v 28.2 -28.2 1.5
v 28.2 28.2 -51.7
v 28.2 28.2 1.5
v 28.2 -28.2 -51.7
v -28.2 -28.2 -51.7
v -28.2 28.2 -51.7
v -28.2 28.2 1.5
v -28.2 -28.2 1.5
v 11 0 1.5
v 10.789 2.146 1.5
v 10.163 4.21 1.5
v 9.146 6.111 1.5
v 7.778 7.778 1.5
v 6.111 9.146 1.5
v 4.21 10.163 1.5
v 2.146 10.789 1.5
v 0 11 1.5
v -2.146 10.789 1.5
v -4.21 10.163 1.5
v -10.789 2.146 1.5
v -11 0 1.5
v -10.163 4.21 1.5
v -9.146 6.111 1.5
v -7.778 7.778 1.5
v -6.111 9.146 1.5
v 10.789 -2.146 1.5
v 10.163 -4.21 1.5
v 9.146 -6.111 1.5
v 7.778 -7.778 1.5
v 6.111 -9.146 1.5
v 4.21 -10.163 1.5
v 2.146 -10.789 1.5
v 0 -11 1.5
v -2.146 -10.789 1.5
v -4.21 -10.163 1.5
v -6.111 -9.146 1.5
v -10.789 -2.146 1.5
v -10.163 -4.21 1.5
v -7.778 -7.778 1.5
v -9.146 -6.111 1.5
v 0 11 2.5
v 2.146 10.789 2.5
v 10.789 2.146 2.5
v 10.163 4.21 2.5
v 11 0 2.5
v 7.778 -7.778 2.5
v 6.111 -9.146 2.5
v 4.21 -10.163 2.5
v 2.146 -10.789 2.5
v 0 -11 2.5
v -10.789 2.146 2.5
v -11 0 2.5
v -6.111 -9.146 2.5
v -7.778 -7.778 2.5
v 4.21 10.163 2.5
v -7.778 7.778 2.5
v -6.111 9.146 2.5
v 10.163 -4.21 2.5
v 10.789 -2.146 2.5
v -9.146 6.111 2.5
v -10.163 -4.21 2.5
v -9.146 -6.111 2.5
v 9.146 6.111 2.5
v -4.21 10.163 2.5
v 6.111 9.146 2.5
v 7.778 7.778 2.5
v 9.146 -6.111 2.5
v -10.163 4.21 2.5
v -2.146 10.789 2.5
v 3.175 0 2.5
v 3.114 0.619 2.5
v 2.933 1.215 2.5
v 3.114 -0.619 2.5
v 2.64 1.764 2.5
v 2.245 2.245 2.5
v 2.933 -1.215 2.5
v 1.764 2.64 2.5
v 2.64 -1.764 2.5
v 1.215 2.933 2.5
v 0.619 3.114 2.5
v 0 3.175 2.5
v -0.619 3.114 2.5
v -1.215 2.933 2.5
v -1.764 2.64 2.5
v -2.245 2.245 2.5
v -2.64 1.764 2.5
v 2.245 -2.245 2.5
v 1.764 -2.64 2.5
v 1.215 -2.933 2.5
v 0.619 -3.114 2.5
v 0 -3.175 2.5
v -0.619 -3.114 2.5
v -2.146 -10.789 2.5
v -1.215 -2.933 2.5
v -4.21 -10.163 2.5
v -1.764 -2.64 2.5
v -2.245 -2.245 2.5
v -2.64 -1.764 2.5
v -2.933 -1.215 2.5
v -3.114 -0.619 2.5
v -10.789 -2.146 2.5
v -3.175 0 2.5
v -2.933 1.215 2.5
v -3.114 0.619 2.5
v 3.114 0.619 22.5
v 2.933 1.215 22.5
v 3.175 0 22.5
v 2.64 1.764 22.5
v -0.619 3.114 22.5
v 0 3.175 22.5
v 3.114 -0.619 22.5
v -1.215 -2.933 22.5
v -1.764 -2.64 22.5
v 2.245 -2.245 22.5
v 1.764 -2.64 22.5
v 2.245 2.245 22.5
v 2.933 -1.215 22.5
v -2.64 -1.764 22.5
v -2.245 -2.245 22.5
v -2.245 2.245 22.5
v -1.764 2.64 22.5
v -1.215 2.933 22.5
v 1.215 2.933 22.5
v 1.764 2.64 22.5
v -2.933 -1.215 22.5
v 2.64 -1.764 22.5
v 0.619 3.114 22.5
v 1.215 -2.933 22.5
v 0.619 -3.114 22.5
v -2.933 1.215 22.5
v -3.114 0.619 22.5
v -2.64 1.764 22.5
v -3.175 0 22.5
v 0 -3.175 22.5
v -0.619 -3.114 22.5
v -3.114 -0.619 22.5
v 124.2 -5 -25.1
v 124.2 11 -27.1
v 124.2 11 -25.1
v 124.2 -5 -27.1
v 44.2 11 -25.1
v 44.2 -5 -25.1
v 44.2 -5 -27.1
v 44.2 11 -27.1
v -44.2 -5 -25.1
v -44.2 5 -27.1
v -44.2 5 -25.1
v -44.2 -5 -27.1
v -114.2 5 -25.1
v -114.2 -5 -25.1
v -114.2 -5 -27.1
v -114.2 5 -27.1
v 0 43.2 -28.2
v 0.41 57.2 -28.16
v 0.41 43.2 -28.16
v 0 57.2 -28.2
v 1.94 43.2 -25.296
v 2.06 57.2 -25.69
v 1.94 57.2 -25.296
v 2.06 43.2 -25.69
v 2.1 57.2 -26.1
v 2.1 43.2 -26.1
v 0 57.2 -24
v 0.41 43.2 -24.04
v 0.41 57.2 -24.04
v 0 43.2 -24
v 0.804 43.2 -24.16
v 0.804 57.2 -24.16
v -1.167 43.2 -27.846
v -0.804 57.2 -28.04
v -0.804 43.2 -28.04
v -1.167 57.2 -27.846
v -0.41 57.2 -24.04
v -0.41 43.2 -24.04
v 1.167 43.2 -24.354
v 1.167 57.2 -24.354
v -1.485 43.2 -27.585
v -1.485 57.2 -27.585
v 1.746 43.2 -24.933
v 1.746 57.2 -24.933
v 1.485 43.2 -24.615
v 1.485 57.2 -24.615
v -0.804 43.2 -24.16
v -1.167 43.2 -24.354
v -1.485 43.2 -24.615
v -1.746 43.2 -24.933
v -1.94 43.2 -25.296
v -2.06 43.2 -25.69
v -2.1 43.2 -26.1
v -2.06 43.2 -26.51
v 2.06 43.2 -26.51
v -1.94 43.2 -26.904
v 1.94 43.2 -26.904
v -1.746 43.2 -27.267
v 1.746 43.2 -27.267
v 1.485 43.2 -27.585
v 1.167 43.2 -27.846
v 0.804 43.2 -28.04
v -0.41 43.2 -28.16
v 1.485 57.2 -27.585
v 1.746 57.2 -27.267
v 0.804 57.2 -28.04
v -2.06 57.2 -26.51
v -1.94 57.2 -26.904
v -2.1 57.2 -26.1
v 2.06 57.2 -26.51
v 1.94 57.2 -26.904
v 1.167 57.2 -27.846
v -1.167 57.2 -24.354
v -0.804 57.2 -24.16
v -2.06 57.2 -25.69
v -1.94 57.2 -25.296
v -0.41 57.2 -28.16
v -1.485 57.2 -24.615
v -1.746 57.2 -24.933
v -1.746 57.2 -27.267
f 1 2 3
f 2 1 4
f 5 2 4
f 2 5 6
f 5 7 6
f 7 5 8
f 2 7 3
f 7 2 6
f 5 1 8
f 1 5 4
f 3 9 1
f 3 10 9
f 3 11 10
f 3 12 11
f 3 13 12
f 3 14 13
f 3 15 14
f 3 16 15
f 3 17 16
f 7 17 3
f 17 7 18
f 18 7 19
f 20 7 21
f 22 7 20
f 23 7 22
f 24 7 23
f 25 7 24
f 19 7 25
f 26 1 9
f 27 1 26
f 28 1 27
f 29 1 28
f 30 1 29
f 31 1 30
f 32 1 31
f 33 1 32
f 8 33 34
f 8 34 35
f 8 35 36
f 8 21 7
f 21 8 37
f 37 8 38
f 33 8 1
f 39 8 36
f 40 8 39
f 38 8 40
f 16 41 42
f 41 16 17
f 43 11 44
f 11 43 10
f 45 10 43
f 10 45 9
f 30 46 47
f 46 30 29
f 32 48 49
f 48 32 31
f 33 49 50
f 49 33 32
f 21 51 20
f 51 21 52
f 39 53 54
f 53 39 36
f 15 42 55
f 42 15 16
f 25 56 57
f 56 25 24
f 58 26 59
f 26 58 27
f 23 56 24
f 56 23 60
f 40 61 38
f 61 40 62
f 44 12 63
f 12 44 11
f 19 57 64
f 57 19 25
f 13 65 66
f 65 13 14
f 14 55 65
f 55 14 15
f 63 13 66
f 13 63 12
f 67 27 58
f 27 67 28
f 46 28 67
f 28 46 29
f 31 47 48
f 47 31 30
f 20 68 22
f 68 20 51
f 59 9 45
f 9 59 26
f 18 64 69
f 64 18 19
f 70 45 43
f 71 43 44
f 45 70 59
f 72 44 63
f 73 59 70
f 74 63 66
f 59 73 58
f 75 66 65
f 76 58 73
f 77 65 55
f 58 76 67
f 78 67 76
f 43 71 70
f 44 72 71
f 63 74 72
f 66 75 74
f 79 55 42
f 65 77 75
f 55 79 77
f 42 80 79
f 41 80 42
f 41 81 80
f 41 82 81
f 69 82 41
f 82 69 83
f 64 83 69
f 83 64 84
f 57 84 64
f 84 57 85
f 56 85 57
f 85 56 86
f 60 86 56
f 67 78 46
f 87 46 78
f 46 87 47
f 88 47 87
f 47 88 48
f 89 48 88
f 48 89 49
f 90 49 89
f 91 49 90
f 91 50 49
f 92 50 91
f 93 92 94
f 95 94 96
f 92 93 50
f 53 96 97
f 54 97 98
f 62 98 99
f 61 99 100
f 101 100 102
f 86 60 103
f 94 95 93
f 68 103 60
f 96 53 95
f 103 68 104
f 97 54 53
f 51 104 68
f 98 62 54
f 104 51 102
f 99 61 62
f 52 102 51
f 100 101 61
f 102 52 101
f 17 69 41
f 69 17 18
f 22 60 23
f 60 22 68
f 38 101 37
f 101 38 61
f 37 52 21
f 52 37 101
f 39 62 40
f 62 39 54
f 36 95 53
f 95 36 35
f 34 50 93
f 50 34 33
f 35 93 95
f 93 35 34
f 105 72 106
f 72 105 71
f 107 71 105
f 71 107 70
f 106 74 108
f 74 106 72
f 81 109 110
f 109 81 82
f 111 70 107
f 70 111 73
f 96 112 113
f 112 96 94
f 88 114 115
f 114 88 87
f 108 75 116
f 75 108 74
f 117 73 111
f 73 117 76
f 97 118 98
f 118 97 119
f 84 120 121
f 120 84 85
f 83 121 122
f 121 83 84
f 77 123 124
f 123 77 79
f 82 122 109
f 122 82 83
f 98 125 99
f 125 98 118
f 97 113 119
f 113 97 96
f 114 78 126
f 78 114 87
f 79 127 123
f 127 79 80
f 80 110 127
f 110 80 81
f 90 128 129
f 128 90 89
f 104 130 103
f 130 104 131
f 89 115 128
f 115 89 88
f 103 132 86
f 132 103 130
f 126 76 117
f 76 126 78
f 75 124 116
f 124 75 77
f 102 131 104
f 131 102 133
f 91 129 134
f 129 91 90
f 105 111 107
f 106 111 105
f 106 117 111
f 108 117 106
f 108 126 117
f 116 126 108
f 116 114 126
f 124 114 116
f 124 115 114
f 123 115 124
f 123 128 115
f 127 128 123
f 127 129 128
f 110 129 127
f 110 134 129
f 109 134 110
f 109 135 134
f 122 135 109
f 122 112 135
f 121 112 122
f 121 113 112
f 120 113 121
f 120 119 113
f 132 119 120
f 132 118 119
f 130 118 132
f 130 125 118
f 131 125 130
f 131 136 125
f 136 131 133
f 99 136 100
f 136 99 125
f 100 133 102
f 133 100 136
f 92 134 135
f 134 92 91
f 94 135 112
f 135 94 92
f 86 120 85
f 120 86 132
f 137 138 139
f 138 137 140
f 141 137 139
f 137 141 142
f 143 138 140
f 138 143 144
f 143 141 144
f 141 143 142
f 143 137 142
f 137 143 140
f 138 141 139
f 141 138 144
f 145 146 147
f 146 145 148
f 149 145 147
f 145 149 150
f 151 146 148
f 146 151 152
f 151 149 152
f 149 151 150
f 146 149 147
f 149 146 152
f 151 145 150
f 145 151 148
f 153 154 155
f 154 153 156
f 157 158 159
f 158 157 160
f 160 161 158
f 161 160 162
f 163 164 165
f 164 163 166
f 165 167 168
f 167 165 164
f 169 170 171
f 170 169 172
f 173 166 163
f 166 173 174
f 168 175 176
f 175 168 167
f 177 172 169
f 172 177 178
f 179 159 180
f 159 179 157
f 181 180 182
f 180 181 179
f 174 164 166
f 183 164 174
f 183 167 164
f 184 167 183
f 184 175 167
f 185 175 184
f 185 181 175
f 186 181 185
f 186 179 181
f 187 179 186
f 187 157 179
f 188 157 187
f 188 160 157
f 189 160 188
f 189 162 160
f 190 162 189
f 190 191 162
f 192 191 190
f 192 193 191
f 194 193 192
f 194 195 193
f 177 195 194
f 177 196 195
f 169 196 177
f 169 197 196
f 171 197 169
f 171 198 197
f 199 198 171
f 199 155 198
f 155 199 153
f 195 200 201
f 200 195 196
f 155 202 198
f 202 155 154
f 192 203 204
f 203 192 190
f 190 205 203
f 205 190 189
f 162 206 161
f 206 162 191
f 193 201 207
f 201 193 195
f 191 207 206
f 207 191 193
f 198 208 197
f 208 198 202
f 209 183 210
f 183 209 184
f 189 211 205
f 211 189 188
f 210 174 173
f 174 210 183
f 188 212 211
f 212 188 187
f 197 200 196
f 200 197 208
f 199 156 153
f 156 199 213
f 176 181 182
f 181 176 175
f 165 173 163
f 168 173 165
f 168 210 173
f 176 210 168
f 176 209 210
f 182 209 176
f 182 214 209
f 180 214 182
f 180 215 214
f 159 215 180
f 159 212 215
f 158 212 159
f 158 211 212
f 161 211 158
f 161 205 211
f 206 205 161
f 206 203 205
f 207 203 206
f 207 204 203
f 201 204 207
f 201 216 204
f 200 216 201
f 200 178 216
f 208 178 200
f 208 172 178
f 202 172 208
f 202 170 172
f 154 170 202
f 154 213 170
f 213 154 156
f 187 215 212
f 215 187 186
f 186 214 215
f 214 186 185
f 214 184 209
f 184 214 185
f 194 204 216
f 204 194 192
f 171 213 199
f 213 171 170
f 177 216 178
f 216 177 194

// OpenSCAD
// Parameters
face_width = 56.4; //[28.2:112.8:0.1]
front_face_thickness = 3.0; //[1.5:6.0:0.1]
body_length = 51.2; //[25.6:102.4:0.1]
body_width = 56.4; //[28.2:112.8:0.1]
body_height = 56.4; //[28.2:112.8:0.1]
shaft_diameter = 6.35; //[3.0:12.7:0.01]
shaft_length = 20.0; //[10.0:40.0:0.1]
boss_diameter = 22.0; //[11.0:44.0:0.1]
boss_thickness = 2.0; //[1.0:6.0:0.1]
mounting_hole_spacing = 47.1; //[23.55:94.2:0.1]
mounting_hole_diameter = 3.5; //[2.0:6.0:0.1]
mounting_hole_depth = 6.0; //[3.0:20.0:0.1]
hole_clearance_extra = 0.2; //[0.0:0.6:0.05]
overlap = 1.0; //[0.5:2.0:0.1]
tab_thickness = 2.0; //[1.0:6.0:0.1]
tab_width = 10.0; //[5.0:25.0:0.1]
tab_length = 18.0; //[8.0:40.0:0.1]
ttrack_length = 80.0; //[40.0:160.0:0.5]
ttrack_pitch = 25.0; //[10.0:50.0:0.5]
ttrack_hole_diameter = 5.0; //[3.0:8.0:0.1]
ttrack_num_insert_holes = 3; //[1:8:1]
rail_length = 70.0; //[35.0:140.0:0.5]
rail_pitch = 20.0; //[10.0:40.0:0.5]
rail_hole_diameter = 4.0; //[2.5:7.0:0.1]
post_4mm_hole_diameter = 4.0; //[3.0:6.0:0.1]
post_block_size = 12.0; //[6.0:24.0:0.1]

// Motor Shaft - Detailed Geometry
module motor_shaft() {
  color("Silver") {
    translate([0, 0, front_face_thickness/2 + boss_thickness - overlap + shaft_length/2])
      cylinder(d=shaft_diameter, h=shaft_length, center=true, $fn=32);
  }
}

// Ttrack Hole Positions - Detailed Geometry
module ttrack_hole_positions() {
  color("DimGray") {
    translate([body_width/2 + tab_length - overlap + ttrack_length/2 - overlap, 0, -(front_face_thickness/2 + body_length/2 - overlap)])
      cube([ttrack_length, tab_width, tab_thickness], center=true);
  }
}

// Ttrack Insert Hole Positions - Detailed Geometry
module ttrack_insert_hole_positions() {
  color("DimGray") {
    translate([body_width/2 + tab_length - overlap + ttrack_length/2 - overlap, tab_width/2 + (tab_width*0.7)/2 - overlap, -(front_face_thickness/2 + body_length/2 - overlap)])
      cube([ttrack_length, tab_width*0.7, tab_thickness], center=true);
  }
}

// Rail Hole Positions - Detailed Geometry
module rail_hole_positions() {
  color("DimGray") {
    translate([-body_width/2 - tab_length + overlap - rail_length/2 + overlap, 0, -(front_face_thickness/2 + body_length/2 - overlap)])
      cube([rail_length, tab_width, tab_thickness], center=true);
  }
}

// Post 4Mm Hole - Detailed Geometry
module post_4mm_hole() {
  color("DimGray") {
    translate([0, body_height/2 + tab_length - overlap + post_block_size/2 - overlap, -(front_face_thickness/2 + body_length/2 - overlap)])
      rotate([90, 0, 0])
      cylinder(d=post_4mm_hole_diameter + hole_clearance_extra, h=post_block_size + 2*overlap, center=true, $fn=32);
  }
}

// Assembly
module assembly() {
  color("Black") {
    // Motor Body
    translate([0, 0, -(front_face_thickness/2 + body_length/2 - overlap)])
      cube([body_width, body_height, body_length], center=true);
    // Front Face
    translate([0, 0, 0])
      cube([face_width, face_width, front_face_thickness], center=true);
    // Shaft Boss
    translate([0, 0, front_face_thickness/2 + boss_thickness/2 - overlap])
      cylinder(d=boss_diameter, h=boss_thickness, center=true, $fn=32);
  }
  motor_shaft();
  ttrack_hole_positions();
  ttrack_insert_hole_positions();
  rail_hole_positions();
  post_4mm_hole();
}

assembly();
